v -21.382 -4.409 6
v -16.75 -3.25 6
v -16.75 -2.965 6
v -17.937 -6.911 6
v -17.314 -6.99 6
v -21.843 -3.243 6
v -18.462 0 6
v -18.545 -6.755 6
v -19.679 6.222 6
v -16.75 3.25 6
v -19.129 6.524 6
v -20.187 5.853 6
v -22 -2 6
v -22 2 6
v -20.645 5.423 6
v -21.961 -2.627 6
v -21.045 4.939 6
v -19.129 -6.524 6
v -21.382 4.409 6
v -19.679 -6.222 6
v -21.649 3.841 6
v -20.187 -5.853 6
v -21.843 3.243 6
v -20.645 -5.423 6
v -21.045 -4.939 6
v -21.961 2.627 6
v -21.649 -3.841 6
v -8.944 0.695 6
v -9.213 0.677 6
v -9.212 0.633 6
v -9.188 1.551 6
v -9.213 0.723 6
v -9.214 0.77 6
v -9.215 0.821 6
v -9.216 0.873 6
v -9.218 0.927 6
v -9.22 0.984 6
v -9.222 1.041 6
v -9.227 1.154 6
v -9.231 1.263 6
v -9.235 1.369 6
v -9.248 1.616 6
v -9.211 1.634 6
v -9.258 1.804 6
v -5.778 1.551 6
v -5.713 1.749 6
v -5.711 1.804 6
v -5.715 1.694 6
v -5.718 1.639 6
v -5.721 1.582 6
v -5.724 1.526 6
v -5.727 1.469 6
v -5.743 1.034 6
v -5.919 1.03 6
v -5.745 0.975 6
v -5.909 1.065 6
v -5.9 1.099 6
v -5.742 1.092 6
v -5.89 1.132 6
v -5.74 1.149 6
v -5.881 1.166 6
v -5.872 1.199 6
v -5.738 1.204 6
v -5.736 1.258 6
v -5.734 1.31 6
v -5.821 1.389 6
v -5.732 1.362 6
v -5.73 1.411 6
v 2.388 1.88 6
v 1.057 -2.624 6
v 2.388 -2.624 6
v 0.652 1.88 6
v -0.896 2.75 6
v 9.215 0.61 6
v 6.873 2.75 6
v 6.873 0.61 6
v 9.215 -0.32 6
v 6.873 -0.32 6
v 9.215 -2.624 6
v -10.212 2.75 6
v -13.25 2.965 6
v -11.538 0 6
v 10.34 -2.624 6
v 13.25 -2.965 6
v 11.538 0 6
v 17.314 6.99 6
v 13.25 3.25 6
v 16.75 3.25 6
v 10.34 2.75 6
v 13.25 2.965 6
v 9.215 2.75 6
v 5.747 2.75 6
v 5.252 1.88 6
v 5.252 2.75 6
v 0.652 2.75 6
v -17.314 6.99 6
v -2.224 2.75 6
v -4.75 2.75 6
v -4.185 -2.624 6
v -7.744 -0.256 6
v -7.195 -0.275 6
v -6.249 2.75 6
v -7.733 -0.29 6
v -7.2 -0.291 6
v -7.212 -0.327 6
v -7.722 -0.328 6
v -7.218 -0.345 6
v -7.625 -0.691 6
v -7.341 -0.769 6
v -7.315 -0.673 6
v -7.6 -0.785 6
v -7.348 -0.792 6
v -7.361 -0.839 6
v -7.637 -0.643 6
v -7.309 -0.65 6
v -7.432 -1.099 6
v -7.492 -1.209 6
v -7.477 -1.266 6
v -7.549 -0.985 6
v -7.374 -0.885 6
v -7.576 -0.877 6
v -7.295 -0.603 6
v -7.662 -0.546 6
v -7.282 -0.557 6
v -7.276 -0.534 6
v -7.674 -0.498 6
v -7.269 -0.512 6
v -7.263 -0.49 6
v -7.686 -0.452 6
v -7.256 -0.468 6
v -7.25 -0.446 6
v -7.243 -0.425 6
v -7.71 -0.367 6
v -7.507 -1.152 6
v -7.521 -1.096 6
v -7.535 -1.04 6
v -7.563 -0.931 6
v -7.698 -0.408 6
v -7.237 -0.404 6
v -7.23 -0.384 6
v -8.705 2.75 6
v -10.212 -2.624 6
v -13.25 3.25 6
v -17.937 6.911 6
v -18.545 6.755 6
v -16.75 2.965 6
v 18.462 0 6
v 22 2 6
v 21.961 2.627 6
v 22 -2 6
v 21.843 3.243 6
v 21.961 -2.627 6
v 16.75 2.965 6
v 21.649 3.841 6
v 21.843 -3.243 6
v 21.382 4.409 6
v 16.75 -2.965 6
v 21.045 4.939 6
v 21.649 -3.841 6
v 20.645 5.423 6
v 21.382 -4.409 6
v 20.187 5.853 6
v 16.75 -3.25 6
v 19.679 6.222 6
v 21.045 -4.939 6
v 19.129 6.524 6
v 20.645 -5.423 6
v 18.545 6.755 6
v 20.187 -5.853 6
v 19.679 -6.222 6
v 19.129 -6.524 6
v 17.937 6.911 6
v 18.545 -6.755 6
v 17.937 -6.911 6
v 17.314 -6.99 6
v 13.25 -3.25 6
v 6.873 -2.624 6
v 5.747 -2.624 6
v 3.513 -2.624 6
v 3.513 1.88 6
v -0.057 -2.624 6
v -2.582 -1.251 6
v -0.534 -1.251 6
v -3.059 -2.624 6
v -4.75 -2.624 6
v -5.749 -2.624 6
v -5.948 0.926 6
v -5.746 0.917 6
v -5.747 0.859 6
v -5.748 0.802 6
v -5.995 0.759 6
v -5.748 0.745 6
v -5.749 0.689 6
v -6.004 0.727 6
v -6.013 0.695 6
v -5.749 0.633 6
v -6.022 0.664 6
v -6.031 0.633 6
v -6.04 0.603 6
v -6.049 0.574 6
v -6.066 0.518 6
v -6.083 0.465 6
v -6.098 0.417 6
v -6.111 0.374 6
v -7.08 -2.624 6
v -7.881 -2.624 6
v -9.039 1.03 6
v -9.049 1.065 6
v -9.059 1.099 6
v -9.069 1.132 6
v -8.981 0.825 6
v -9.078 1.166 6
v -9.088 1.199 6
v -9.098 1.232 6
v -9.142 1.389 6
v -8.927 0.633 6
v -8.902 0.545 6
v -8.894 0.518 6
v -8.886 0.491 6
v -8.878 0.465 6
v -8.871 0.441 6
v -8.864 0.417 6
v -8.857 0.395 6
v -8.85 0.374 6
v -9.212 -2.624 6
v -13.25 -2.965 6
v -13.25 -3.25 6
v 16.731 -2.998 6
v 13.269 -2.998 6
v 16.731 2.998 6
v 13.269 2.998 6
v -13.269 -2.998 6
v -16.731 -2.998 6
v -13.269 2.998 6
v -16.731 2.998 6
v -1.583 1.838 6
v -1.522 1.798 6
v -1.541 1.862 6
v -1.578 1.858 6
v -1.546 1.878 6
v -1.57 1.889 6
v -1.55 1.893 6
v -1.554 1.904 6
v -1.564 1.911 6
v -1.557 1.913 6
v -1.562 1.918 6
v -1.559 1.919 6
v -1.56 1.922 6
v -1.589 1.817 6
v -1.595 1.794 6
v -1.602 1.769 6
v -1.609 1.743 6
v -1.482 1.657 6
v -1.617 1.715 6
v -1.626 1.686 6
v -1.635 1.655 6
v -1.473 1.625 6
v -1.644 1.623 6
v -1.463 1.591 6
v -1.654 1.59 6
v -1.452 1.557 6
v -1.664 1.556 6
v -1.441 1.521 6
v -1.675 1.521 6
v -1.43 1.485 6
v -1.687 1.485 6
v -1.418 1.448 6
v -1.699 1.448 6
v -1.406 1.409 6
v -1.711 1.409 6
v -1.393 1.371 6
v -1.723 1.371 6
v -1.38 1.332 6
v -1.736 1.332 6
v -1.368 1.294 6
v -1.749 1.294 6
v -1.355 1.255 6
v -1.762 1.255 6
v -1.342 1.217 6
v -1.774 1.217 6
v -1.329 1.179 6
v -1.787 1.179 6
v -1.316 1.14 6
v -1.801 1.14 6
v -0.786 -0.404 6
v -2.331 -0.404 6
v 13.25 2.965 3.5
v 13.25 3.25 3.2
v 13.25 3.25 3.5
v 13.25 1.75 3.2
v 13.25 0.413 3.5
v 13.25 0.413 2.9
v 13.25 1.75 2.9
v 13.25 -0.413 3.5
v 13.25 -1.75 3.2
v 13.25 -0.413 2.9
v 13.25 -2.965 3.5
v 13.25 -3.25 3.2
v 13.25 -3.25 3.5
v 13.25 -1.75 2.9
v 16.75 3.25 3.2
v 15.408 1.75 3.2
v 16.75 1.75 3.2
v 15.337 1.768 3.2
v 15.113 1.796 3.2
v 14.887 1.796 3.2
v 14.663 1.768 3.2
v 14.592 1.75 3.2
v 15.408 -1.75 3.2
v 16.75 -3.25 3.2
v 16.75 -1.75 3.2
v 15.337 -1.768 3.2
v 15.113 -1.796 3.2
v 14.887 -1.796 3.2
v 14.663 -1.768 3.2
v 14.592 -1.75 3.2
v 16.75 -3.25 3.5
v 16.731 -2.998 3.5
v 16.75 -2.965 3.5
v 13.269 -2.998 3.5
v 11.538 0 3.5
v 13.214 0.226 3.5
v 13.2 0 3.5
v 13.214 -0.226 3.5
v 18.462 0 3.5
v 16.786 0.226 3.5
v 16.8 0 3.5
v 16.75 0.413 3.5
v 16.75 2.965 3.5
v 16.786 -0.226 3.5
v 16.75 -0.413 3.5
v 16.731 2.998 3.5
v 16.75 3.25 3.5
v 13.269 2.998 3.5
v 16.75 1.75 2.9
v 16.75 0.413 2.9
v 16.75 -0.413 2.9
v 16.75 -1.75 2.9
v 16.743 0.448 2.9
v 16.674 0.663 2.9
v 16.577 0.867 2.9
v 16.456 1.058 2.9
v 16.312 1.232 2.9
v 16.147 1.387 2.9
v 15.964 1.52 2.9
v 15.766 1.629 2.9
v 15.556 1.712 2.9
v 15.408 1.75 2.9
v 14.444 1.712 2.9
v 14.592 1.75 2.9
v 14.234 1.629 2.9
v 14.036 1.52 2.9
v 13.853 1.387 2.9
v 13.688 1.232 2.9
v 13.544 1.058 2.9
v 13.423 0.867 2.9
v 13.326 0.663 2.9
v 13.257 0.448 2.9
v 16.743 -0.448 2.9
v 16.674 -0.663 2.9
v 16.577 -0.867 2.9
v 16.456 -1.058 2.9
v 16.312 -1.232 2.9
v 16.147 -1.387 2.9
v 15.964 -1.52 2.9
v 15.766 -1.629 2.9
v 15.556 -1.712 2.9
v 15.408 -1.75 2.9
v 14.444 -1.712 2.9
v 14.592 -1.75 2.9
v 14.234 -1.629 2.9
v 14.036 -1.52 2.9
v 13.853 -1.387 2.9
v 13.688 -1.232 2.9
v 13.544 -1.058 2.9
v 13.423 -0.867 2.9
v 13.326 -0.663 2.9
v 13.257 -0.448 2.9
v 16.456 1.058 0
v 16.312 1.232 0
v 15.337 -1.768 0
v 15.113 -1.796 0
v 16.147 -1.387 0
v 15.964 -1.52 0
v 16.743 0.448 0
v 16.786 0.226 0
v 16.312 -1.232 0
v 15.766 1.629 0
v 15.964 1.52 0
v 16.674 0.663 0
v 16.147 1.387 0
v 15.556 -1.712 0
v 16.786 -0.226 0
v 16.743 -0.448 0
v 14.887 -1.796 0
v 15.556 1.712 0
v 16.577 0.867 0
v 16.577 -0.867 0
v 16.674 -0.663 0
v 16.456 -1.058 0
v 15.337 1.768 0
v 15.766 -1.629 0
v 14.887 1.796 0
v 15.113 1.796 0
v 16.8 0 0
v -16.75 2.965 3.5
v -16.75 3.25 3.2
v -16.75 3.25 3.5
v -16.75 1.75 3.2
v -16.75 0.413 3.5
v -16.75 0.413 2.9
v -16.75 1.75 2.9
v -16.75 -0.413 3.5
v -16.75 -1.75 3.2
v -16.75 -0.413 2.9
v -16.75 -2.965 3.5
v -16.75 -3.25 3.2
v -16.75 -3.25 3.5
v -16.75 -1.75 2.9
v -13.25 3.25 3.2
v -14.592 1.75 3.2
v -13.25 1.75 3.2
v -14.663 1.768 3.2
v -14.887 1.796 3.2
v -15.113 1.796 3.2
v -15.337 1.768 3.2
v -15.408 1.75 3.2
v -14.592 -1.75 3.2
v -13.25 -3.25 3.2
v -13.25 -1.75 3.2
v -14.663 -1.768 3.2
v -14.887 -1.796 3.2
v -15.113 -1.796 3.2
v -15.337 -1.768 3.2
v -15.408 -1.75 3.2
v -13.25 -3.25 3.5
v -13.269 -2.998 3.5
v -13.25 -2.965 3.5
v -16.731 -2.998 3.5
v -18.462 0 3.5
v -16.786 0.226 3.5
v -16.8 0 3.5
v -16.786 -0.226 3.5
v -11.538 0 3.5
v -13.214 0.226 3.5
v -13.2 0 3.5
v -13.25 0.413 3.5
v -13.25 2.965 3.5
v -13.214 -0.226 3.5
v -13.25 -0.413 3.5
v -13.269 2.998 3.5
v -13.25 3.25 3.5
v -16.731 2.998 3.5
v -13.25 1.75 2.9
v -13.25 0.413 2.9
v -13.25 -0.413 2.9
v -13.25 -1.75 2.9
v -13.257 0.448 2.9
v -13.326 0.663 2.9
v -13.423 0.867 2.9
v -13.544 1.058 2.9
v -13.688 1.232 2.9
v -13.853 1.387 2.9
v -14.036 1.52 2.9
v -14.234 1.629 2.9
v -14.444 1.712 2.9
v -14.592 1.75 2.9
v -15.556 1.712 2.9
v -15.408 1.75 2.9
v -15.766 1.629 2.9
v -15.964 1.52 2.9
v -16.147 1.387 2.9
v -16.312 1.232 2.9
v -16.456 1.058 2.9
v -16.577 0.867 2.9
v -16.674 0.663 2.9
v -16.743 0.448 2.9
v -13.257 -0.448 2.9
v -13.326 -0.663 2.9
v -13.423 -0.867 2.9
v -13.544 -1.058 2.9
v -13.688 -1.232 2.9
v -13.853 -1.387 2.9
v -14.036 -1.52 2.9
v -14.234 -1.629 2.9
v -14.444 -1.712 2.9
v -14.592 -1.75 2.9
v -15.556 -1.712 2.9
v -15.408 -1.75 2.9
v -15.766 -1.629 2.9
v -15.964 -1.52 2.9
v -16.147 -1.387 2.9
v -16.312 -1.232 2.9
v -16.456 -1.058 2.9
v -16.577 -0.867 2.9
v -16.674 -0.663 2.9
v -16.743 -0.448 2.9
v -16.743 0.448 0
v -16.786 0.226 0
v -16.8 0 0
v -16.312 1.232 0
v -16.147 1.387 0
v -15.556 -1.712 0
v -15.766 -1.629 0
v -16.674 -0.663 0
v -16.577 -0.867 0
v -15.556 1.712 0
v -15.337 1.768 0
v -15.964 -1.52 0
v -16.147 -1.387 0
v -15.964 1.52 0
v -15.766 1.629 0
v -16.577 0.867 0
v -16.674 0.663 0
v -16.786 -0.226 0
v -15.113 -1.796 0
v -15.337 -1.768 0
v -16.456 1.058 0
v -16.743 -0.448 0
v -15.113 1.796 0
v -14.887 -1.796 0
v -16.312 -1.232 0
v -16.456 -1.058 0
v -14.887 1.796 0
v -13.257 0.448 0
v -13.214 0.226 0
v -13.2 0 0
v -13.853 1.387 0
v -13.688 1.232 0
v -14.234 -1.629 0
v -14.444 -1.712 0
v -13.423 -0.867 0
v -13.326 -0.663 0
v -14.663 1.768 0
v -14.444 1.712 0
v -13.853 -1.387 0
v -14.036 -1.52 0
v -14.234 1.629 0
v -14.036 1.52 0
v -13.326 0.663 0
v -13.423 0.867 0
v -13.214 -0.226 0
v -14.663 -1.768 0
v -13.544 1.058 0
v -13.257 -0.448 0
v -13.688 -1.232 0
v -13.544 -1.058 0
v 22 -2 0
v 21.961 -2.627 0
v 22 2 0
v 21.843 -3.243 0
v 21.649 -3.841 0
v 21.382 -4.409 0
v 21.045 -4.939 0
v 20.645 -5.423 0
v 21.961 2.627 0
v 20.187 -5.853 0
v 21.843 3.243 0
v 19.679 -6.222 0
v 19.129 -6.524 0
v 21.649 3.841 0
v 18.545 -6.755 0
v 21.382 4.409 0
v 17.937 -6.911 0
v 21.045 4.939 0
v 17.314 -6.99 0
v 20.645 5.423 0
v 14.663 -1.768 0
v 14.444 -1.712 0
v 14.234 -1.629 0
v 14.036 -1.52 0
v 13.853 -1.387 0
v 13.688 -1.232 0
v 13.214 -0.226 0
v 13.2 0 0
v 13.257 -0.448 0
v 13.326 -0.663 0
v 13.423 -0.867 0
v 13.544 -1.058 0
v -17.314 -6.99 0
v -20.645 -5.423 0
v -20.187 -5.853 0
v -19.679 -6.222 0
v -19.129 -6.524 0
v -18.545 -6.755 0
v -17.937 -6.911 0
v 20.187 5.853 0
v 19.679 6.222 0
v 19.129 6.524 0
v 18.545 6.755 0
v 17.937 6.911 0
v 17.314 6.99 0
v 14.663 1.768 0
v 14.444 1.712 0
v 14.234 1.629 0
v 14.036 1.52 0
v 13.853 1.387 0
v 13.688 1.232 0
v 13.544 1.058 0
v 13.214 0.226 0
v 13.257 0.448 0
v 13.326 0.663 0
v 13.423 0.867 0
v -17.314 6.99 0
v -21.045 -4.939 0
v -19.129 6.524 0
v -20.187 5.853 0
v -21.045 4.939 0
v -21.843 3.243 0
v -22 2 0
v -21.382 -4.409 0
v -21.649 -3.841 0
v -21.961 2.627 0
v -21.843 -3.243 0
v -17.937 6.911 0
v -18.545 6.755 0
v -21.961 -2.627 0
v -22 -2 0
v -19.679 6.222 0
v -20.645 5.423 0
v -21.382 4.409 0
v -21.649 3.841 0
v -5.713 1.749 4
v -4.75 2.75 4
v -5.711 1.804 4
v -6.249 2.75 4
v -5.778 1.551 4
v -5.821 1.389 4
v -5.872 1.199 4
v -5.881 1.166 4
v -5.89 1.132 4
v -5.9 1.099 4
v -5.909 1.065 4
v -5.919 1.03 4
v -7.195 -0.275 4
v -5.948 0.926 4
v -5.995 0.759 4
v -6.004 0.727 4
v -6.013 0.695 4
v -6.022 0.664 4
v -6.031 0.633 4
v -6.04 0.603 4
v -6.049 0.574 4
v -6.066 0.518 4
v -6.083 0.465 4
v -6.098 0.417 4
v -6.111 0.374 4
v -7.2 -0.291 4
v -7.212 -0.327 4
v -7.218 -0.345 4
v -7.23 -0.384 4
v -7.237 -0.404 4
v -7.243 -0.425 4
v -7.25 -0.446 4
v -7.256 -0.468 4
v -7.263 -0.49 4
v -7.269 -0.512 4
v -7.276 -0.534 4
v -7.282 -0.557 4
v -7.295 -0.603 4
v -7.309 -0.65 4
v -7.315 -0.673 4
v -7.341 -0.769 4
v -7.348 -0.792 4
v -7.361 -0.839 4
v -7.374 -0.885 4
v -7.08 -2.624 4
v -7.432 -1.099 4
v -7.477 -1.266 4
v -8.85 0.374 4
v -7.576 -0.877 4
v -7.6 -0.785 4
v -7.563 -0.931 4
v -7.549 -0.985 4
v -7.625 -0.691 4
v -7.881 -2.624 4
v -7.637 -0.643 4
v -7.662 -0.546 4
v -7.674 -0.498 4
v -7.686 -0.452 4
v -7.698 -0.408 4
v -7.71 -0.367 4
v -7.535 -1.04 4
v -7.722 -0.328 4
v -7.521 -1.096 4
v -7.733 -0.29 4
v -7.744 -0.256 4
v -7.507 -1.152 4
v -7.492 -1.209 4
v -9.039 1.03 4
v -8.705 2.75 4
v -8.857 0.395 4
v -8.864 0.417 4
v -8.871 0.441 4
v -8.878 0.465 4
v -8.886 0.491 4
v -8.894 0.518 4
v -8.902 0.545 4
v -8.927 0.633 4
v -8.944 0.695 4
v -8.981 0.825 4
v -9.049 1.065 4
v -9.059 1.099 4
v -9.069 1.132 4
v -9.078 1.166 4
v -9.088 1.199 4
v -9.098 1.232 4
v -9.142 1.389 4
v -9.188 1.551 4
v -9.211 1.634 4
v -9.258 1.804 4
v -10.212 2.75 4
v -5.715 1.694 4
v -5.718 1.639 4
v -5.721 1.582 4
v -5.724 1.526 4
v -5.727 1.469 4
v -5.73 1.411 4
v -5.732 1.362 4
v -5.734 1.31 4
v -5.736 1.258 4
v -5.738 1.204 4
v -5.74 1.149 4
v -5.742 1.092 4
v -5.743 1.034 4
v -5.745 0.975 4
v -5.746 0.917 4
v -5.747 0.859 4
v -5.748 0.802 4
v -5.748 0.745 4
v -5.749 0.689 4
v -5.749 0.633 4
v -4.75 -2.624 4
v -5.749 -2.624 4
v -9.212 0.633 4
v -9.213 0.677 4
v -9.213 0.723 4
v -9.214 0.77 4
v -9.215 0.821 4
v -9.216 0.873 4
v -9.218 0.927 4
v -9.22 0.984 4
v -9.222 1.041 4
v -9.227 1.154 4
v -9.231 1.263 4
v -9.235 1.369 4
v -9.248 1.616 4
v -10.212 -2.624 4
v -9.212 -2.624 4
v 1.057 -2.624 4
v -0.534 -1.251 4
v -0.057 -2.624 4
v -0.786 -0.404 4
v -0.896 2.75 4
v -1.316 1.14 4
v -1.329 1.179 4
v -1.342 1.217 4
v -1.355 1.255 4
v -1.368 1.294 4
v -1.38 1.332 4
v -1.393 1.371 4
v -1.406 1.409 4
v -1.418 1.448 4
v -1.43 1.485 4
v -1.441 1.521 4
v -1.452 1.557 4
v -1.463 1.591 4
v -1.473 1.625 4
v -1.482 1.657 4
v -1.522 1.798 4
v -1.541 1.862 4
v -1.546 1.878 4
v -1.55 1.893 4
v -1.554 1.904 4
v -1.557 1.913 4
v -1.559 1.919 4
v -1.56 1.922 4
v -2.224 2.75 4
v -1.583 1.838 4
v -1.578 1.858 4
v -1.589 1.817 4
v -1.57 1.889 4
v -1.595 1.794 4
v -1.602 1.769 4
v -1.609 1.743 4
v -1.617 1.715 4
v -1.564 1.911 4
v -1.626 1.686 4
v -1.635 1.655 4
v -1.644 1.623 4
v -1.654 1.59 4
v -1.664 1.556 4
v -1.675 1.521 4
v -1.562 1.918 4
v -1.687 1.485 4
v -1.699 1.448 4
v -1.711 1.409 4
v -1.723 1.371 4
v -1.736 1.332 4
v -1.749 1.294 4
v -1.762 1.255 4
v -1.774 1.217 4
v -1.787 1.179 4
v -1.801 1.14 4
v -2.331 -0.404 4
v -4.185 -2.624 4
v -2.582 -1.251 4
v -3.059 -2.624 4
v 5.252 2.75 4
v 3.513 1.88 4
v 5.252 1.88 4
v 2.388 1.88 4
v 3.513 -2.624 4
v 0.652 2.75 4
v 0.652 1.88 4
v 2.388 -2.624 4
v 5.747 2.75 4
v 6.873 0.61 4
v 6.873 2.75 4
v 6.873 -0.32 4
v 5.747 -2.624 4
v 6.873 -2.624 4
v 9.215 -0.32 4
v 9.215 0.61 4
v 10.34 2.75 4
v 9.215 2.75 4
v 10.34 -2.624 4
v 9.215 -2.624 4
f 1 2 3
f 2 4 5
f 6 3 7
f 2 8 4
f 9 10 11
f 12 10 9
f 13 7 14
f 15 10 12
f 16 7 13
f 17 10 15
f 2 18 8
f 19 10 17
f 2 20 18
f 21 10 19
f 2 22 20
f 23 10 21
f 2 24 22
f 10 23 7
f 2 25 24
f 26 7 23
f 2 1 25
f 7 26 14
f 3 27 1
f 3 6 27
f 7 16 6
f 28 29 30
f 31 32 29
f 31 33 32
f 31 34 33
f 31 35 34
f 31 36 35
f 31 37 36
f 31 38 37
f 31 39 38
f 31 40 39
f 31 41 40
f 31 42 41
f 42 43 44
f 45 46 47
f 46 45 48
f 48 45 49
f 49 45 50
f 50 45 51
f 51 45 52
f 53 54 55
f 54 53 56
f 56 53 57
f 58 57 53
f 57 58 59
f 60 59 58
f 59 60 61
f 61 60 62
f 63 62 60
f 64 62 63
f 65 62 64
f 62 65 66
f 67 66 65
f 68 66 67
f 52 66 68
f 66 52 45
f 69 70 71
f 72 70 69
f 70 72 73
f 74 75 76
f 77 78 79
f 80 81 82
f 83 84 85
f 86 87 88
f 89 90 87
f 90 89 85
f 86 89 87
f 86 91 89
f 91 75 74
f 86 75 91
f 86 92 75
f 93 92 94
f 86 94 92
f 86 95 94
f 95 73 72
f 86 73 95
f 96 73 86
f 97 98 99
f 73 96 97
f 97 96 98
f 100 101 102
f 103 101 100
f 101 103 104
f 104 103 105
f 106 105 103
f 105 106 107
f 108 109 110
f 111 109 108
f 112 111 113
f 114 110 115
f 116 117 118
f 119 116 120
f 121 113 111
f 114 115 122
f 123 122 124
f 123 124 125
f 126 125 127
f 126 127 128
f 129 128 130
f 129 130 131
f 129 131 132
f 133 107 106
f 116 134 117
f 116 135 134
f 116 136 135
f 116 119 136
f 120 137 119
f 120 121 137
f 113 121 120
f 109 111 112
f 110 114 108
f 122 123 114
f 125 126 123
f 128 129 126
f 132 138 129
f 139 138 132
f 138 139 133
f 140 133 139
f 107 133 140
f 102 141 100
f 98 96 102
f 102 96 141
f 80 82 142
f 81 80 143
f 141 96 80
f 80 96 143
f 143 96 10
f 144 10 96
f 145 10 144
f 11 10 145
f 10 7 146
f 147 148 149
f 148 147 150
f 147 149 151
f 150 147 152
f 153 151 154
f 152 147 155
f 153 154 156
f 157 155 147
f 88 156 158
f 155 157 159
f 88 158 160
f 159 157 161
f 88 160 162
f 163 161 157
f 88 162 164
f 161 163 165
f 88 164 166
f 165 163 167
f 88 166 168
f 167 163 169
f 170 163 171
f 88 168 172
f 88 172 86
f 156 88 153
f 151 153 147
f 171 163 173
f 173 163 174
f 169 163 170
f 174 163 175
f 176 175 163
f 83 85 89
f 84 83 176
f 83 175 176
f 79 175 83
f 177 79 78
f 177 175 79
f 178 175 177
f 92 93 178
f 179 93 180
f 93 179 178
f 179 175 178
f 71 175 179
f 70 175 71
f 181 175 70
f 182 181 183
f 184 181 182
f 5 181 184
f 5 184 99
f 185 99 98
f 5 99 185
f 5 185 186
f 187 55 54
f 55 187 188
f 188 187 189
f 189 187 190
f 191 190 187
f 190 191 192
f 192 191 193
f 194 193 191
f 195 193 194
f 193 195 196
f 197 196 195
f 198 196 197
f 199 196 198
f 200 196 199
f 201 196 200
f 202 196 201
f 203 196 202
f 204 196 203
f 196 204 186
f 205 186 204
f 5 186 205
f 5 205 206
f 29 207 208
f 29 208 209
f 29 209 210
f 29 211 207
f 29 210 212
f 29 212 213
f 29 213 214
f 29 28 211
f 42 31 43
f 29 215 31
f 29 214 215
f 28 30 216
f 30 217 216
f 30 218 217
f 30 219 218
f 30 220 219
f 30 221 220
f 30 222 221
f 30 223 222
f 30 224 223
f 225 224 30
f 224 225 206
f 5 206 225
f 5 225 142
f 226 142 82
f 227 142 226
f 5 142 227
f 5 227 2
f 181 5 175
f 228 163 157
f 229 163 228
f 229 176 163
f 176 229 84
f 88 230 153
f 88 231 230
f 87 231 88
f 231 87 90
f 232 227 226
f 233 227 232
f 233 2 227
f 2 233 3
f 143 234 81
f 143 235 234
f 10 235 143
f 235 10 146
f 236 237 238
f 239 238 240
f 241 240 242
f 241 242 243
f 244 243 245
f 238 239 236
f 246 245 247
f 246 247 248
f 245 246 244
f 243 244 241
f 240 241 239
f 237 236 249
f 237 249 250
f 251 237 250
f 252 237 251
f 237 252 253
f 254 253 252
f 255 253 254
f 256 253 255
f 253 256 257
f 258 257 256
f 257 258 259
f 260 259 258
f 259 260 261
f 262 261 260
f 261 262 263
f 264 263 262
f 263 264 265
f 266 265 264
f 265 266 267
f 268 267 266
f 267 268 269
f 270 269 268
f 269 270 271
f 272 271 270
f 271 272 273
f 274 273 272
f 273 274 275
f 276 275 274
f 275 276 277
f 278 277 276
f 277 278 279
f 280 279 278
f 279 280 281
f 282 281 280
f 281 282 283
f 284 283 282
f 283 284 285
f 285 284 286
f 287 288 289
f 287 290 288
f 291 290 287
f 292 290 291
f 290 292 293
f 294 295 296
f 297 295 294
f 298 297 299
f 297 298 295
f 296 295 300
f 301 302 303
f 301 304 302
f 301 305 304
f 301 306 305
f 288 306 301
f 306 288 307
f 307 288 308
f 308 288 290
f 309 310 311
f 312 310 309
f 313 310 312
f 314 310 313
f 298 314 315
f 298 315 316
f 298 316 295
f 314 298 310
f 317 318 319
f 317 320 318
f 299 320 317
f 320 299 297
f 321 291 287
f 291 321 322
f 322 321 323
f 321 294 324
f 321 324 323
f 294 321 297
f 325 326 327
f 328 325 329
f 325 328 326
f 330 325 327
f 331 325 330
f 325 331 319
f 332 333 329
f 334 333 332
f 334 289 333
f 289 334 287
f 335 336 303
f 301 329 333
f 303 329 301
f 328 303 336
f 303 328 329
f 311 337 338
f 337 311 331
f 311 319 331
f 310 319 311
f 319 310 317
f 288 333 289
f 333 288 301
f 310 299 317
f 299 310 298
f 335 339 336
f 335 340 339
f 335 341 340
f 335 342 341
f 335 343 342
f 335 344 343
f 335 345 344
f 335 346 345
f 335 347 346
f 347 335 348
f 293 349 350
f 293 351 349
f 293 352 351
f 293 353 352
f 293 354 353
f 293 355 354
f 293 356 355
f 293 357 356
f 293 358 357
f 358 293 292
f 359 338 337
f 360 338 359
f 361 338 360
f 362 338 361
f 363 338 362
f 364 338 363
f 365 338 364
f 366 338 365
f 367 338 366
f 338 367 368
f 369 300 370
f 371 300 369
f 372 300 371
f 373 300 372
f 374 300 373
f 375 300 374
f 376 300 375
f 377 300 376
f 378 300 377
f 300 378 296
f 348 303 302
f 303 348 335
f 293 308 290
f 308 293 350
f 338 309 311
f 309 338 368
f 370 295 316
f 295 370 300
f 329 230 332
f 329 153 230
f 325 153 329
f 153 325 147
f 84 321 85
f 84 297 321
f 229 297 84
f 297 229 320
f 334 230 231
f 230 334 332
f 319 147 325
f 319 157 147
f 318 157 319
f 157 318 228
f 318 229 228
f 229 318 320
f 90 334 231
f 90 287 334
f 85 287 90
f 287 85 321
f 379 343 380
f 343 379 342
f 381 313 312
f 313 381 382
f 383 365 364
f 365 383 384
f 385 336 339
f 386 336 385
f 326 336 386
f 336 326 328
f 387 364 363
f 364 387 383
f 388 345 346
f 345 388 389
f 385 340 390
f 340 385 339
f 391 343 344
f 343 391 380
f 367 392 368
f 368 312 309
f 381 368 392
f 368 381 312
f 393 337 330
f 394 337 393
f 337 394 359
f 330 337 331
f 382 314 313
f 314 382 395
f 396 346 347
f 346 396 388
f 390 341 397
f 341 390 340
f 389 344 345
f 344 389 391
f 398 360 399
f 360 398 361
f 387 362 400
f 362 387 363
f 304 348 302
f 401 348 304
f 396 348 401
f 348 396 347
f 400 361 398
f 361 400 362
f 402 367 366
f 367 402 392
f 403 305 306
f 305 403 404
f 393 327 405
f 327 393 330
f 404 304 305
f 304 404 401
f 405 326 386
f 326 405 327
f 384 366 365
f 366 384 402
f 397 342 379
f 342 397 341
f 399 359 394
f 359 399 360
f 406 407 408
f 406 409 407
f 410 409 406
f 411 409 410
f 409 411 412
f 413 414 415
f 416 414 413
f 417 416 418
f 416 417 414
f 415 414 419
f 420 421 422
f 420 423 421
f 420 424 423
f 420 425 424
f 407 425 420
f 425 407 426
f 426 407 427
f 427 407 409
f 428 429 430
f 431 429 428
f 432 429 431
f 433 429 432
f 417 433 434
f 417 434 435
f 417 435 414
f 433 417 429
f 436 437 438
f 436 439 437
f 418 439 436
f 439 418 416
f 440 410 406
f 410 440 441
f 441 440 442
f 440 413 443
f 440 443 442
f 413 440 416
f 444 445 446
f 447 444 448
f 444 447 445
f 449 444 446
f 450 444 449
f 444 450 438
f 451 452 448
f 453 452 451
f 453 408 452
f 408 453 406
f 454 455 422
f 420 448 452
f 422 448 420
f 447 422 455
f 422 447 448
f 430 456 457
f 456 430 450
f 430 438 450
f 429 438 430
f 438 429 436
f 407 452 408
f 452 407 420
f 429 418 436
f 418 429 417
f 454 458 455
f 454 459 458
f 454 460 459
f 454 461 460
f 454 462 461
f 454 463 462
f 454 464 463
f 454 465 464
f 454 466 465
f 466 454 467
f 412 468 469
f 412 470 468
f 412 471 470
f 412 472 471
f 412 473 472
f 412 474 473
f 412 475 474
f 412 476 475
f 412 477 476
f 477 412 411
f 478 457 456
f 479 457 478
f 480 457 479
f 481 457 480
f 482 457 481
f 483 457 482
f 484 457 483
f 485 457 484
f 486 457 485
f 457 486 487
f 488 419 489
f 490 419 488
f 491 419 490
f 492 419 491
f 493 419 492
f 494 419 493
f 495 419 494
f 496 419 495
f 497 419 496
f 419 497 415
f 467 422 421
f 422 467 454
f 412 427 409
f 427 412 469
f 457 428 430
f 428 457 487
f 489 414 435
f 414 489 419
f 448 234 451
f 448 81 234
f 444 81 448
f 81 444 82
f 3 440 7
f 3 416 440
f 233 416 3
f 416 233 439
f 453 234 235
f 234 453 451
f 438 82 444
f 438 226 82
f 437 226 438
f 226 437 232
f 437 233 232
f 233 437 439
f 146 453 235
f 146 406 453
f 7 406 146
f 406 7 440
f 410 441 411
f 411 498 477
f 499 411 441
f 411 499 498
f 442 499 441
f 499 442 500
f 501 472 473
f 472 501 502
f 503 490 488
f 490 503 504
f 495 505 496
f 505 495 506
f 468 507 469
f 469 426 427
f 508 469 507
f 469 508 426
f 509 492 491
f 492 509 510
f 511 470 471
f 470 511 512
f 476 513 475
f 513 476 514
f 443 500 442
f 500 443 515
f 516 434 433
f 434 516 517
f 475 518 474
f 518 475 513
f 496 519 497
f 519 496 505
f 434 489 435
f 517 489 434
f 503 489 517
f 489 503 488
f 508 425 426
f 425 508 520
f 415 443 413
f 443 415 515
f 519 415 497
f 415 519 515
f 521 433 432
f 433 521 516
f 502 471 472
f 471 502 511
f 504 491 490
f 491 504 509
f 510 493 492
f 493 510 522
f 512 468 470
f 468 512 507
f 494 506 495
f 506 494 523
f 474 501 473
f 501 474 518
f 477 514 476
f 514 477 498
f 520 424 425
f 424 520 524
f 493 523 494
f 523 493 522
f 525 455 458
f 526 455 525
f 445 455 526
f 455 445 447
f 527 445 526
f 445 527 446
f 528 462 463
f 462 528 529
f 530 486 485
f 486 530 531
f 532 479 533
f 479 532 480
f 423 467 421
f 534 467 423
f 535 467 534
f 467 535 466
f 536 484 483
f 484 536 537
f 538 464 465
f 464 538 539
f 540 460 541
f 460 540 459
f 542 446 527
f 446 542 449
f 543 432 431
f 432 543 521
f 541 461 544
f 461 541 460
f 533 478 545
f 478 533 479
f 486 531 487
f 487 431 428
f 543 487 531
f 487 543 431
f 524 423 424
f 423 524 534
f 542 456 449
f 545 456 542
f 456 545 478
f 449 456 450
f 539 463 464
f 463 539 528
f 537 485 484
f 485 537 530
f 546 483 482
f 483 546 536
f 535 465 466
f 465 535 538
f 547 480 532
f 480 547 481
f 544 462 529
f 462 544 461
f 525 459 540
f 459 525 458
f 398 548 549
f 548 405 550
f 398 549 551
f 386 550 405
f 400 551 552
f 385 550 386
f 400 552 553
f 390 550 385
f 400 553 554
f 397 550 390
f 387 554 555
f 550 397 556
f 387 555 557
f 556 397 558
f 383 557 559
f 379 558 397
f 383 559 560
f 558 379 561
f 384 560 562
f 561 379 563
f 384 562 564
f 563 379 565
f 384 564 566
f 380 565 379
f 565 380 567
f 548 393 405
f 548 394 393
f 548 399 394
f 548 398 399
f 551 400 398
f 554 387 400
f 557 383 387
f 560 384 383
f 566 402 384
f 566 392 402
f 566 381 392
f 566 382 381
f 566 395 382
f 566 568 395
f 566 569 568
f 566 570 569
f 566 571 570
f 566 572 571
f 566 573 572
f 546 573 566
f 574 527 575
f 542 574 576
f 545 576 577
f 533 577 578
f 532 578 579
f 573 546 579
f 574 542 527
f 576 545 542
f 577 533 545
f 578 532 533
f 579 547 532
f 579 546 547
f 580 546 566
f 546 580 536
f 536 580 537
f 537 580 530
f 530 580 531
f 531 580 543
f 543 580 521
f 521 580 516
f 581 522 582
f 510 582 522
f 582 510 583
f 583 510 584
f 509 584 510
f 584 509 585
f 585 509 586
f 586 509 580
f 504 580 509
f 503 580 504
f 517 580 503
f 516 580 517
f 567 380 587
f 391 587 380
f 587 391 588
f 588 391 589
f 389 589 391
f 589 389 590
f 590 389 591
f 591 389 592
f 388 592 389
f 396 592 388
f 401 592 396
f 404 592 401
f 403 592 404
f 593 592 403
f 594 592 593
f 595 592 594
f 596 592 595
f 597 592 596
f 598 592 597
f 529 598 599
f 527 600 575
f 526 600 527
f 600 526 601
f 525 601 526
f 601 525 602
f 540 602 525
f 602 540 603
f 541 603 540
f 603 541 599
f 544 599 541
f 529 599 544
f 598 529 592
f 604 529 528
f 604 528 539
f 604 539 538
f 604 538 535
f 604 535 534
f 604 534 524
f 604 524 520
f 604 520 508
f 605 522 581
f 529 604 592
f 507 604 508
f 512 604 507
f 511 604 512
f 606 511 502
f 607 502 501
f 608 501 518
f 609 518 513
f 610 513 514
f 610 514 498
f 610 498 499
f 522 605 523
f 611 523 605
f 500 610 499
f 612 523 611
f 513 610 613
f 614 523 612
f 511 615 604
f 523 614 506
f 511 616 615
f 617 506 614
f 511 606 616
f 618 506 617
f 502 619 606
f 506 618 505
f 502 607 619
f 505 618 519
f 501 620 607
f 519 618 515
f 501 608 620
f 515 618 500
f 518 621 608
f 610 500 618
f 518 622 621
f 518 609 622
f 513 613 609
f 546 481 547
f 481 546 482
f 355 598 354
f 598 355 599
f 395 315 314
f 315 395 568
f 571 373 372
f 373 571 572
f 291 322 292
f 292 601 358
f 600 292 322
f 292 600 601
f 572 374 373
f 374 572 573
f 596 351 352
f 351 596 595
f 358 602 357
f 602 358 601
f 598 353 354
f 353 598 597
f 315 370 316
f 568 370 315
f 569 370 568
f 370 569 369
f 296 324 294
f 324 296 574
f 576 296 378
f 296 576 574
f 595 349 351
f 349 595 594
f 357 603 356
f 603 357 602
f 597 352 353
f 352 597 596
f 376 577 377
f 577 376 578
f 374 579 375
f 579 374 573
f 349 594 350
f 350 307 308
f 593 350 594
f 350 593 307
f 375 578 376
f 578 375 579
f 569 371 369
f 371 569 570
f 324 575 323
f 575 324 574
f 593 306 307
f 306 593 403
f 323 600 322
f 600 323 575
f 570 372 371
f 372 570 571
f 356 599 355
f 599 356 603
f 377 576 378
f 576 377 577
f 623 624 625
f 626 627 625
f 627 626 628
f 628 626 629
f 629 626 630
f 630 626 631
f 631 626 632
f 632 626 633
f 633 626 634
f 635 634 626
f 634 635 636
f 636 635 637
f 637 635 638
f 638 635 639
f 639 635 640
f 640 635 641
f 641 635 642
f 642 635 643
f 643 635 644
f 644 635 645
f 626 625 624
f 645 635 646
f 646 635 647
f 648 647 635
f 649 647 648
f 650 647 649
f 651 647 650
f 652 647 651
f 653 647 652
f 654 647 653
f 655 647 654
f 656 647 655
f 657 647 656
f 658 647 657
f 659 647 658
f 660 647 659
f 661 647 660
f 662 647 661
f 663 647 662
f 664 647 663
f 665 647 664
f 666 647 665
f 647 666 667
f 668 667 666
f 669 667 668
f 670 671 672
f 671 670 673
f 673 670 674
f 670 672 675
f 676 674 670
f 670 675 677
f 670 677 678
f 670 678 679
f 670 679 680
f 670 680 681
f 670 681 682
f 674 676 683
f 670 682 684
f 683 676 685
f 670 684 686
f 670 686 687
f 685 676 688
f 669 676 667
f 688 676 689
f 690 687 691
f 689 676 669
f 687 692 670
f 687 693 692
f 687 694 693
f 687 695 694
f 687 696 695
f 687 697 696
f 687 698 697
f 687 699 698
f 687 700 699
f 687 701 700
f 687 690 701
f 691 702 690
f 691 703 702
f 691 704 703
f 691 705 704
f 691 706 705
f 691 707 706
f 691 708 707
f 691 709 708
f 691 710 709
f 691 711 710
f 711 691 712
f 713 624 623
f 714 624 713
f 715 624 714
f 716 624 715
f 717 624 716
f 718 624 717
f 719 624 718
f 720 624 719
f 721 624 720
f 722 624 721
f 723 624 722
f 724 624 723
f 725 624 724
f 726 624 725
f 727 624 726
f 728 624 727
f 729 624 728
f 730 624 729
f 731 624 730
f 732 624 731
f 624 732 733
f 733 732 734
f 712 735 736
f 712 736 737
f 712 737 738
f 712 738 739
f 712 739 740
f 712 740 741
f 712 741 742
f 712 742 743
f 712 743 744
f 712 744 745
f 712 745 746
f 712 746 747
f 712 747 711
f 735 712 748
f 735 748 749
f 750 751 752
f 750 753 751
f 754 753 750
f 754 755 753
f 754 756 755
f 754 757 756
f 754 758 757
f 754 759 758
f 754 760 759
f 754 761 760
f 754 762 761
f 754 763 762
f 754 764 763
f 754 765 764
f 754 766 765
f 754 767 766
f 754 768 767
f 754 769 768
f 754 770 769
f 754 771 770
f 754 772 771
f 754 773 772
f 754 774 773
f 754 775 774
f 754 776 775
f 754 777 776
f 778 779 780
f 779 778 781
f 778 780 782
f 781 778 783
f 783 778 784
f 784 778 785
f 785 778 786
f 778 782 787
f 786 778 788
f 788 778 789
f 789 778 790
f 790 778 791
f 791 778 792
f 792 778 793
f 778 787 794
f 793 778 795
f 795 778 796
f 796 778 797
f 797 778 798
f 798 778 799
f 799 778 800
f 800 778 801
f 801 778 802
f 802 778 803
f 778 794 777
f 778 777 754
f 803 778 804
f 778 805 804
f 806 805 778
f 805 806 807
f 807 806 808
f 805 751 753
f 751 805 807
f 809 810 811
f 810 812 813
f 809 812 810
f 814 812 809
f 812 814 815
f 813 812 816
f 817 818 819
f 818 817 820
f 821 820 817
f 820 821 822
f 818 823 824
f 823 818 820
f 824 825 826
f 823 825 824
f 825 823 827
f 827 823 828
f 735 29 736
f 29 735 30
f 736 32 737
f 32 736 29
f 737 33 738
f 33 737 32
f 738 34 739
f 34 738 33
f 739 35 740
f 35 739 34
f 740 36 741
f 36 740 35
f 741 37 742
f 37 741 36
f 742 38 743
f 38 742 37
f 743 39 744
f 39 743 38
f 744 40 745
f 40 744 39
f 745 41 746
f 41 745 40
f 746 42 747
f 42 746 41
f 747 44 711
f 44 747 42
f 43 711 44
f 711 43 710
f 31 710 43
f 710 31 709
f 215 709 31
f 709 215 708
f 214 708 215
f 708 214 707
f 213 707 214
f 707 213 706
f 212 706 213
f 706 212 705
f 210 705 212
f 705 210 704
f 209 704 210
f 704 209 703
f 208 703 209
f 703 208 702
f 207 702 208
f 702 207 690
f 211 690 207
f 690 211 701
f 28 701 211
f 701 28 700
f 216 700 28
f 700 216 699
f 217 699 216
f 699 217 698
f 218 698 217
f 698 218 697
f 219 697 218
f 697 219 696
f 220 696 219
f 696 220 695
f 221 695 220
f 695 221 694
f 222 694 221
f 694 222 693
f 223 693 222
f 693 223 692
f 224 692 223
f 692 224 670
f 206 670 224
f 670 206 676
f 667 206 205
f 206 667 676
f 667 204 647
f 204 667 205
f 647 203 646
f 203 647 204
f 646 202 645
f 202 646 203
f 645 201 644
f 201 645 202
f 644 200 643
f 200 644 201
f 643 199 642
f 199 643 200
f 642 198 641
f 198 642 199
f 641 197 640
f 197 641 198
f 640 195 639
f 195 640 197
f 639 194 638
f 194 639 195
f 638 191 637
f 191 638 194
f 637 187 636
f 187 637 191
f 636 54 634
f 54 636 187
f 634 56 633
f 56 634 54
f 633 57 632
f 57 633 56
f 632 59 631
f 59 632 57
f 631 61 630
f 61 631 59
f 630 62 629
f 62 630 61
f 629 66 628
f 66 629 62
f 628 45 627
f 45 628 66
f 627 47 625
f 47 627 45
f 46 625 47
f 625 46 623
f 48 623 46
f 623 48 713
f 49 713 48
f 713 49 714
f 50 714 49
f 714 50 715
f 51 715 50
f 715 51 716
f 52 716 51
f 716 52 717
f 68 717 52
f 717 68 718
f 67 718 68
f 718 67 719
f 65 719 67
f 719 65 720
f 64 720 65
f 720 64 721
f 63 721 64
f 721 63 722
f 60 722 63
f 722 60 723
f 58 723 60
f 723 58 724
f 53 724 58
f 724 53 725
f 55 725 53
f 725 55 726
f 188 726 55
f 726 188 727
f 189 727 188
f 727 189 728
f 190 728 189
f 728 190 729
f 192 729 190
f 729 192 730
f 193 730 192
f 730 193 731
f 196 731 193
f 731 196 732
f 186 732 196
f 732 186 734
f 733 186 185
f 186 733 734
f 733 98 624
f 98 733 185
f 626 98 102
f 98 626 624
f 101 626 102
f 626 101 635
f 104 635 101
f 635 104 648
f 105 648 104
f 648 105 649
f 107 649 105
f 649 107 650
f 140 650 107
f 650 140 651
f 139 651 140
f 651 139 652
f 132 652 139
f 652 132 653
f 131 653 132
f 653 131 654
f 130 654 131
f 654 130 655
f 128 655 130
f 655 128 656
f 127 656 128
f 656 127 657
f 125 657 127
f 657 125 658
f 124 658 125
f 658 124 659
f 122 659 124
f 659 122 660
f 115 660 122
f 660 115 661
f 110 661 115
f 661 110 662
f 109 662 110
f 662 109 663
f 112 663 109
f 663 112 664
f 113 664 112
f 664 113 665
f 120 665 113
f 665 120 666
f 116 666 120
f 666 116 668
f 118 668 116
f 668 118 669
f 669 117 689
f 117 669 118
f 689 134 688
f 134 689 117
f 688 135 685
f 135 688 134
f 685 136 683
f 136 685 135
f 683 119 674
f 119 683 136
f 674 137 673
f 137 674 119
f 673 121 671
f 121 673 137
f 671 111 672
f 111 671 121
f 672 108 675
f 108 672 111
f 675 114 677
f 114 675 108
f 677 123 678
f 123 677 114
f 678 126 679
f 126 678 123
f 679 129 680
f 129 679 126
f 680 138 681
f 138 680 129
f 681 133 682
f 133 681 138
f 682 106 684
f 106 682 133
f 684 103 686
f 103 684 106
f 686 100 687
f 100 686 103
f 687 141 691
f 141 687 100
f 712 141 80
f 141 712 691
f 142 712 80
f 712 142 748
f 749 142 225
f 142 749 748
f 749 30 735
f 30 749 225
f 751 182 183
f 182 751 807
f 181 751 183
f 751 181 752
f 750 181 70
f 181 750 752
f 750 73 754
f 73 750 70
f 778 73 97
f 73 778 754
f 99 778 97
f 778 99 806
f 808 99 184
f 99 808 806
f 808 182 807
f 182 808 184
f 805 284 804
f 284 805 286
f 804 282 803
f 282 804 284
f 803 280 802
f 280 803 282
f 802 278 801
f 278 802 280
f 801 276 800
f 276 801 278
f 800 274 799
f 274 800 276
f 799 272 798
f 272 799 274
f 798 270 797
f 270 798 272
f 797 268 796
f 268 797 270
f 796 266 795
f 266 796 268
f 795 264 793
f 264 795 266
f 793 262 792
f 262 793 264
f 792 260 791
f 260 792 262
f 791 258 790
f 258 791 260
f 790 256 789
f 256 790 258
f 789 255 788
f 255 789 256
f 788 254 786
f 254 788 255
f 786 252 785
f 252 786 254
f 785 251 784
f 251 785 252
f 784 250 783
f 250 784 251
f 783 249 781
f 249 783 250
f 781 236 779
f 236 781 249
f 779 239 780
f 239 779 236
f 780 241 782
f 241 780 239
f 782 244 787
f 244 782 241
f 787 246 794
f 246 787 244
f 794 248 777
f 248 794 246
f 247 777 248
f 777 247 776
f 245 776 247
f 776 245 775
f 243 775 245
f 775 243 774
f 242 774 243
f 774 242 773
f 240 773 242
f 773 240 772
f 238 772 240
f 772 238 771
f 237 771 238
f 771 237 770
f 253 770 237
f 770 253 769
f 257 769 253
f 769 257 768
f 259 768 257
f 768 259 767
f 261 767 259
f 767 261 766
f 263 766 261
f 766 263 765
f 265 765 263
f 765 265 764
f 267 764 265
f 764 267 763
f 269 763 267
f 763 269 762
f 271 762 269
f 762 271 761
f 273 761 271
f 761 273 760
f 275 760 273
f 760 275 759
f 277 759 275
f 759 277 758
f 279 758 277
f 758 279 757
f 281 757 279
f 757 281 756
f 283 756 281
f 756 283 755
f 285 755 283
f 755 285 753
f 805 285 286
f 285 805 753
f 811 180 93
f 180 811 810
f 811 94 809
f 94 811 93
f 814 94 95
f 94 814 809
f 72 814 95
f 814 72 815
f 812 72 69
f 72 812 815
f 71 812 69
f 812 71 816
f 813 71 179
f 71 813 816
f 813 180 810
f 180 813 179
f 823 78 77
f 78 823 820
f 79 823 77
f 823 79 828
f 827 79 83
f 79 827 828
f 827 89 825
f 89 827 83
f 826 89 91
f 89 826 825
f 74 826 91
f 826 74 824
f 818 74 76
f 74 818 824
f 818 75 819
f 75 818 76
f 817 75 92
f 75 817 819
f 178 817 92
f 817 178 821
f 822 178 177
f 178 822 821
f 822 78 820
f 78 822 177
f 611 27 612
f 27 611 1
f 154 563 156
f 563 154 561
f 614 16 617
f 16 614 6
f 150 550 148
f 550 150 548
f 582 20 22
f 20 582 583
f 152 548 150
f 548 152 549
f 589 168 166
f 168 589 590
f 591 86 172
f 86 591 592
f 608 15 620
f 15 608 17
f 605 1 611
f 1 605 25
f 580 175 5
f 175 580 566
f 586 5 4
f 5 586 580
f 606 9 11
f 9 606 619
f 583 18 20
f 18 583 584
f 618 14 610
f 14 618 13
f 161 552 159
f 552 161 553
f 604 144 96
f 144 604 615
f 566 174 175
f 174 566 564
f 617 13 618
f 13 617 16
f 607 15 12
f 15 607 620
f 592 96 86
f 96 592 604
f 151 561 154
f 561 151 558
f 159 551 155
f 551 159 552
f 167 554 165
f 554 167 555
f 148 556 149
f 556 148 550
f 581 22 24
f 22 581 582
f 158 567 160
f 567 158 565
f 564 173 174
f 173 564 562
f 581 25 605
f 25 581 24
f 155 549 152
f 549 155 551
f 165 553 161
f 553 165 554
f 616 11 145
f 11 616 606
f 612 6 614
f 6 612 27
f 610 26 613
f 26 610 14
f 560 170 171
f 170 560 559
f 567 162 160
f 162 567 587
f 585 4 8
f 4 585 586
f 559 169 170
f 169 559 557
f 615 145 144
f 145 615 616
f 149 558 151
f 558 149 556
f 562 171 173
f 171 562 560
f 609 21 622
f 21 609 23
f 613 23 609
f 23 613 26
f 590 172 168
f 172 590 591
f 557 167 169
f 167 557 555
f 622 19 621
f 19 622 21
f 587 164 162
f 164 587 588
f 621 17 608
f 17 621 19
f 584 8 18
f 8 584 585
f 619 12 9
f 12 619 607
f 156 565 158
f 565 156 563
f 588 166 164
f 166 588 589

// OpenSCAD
$fn = 50;


difference() {
	union() {
		hull() {
			translate(v = [-17.0000000000, 2.0000000000, 0]) {
				cylinder(h = 6, r = 5);
			}
			translate(v = [17.0000000000, 2.0000000000, 0]) {
				cylinder(h = 6, r = 5);
			}
			translate(v = [-17.0000000000, -2.0000000000, 0]) {
				cylinder(h = 6, r = 5);
			}
			translate(v = [17.0000000000, -2.0000000000, 0]) {
				cylinder(h = 6, r = 5);
			}
		}
	}
	union() {
		translate(v = [15.0000000000, 0, -20]) {
			rotate(a = [0, 180, 0]) {
				difference() {
					union() {
						translate(v = [0, 0, -26.0000000000]) {
							rotate(a = [0, 0, 0]) {
								difference() {
									union() {
										#translate(v = [-1.7500000000, -3.2500000000, -0.3000000000]) {
											cube(size = [3.5000000000, 6.5000000000, 0.3000000000]);
										}
										#translate(v = [-1.7500000000, -1.7500000000, -0.6000000000]) {
											cube(size = [3.5000000000, 3.5000000000, 0.3000000000]);
										}
										#translate(v = [-1.7500000000, -3.2500000000, 2.5000000000]) {
											cube(size = [3.5000000000, 6.5000000000, 0.3000000000]);
										}
										#translate(v = [-1.7500000000, -1.7500000000, 2.8000000000]) {
											cube(size = [3.5000000000, 3.5000000000, 0.3000000000]);
										}
										#linear_extrude(height = 2.5000000000) {
											polygon(points = [[3.4620000000, 0.0000000000], [1.7310000000, 2.9981799479], [-1.7310000000, 2.9981799479], [-3.4620000000, 0.0000000000], [-1.7310000000, -2.9981799479], [1.7310000000, -2.9981799479]]);
										}
										#translate(v = [-1.7500000000, -3.2500000000, -0.3000000000]) {
											cube(size = [3.5000000000, 6.5000000000, 0.3000000000]);
										}
										#translate(v = [-1.7500000000, -1.7500000000, -0.6000000000]) {
											cube(size = [3.5000000000, 3.5000000000, 0.3000000000]);
										}
										#translate(v = [-1.7500000000, -3.2500000000, 2.5000000000]) {
											cube(size = [3.5000000000, 6.5000000000, 0.3000000000]);
										}
										#translate(v = [-1.7500000000, -1.7500000000, 2.8000000000]) {
											cube(size = [3.5000000000, 3.5000000000, 0.3000000000]);
										}
										#translate(v = [-1.7500000000, -3.2500000000, -0.3000000000]) {
											cube(size = [3.5000000000, 6.5000000000, 0.3000000000]);
										}
										#translate(v = [-1.7500000000, -1.7500000000, -0.6000000000]) {
											cube(size = [3.5000000000, 3.5000000000, 0.3000000000]);
										}
										#translate(v = [-1.7500000000, -3.2500000000, 2.5000000000]) {
											cube(size = [3.5000000000, 6.5000000000, 0.3000000000]);
										}
										#translate(v = [-1.7500000000, -1.7500000000, 2.8000000000]) {
											cube(size = [3.5000000000, 3.5000000000, 0.3000000000]);
										}
									}
									union();
								}
							}
						}
						translate(v = [0, 0, -26.0000000000]) {
							rotate(a = [0, 0, 0]) {
								difference() {
									union() {
										#translate(v = [-1.7500000000, -3.2500000000, -0.3000000000]) {
											cube(size = [3.5000000000, 6.5000000000, 0.3000000000]);
										}
										#translate(v = [-1.7500000000, -1.7500000000, -0.6000000000]) {
											cube(size = [3.5000000000, 3.5000000000, 0.3000000000]);
										}
										#translate(v = [-1.7500000000, -3.2500000000, 2.5000000000]) {
											cube(size = [3.5000000000, 6.5000000000, 0.3000000000]);
										}
										#translate(v = [-1.7500000000, -1.7500000000, 2.8000000000]) {
											cube(size = [3.5000000000, 3.5000000000, 0.3000000000]);
										}
										#linear_extrude(height = 2.5000000000) {
											polygon(points = [[3.4620000000, 0.0000000000], [1.7310000000, 2.9981799479], [-1.7310000000, 2.9981799479], [-3.4620000000, 0.0000000000], [-1.7310000000, -2.9981799479], [1.7310000000, -2.9981799479]]);
										}
										#translate(v = [-1.7500000000, -3.2500000000, -0.3000000000]) {
											cube(size = [3.5000000000, 6.5000000000, 0.3000000000]);
										}
										#translate(v = [-1.7500000000, -1.7500000000, -0.6000000000]) {
											cube(size = [3.5000000000, 3.5000000000, 0.3000000000]);
										}
										#translate(v = [-1.7500000000, -3.2500000000, 2.5000000000]) {
											cube(size = [3.5000000000, 6.5000000000, 0.3000000000]);
										}
										#translate(v = [-1.7500000000, -1.7500000000, 2.8000000000]) {
											cube(size = [3.5000000000, 3.5000000000, 0.3000000000]);
										}
										#translate(v = [-1.7500000000, -3.2500000000, -0.3000000000]) {
											cube(size = [3.5000000000, 6.5000000000, 0.3000000000]);
										}
										#translate(v = [-1.7500000000, -1.7500000000, -0.6000000000]) {
											cube(size = [3.5000000000, 3.5000000000, 0.3000000000]);
										}
										#translate(v = [-1.7500000000, -3.2500000000, 2.5000000000]) {
											cube(size = [3.5000000000, 6.5000000000, 0.3000000000]);
										}
										#translate(v = [-1.7500000000, -1.7500000000, 2.8000000000]) {
											cube(size = [3.5000000000, 3.5000000000, 0.3000000000]);
										}
									}
									union();
								}
							}
						}
						translate(v = [0, 0, -26.0000000000]) {
							rotate(a = [0, 0, 0]) {
								difference() {
									union() {
										#translate(v = [-1.7500000000, -3.2500000000, -0.3000000000]) {
											cube(size = [3.5000000000, 6.5000000000, 0.3000000000]);
										}
										#translate(v = [-1.7500000000, -1.7500000000, -0.6000000000]) {
											cube(size = [3.5000000000, 3.5000000000, 0.3000000000]);
										}
										#translate(v = [-1.7500000000, -3.2500000000, 2.5000000000]) {
											cube(size = [3.5000000000, 6.5000000000, 0.3000000000]);
										}
										#translate(v = [-1.7500000000, -1.7500000000, 2.8000000000]) {
											cube(size = [3.5000000000, 3.5000000000, 0.3000000000]);
										}
										#linear_extrude(height = 2.5000000000) {
											polygon(points = [[3.4620000000, 0.0000000000], [1.7310000000, 2.9981799479], [-1.7310000000, 2.9981799479], [-3.4620000000, 0.0000000000], [-1.7310000000, -2.9981799479], [1.7310000000, -2.9981799479]]);
										}
										#translate(v = [-1.7500000000, -3.2500000000, -0.3000000000]) {
											cube(size = [3.5000000000, 6.5000000000, 0.3000000000]);
										}
										#translate(v = [-1.7500000000, -1.7500000000, -0.6000000000]) {
											cube(size = [3.5000000000, 3.5000000000, 0.3000000000]);
										}
										#translate(v = [-1.7500000000, -3.2500000000, 2.5000000000]) {
											cube(size = [3.5000000000, 6.5000000000, 0.3000000000]);
										}
										#translate(v = [-1.7500000000, -1.7500000000, 2.8000000000]) {
											cube(size = [3.5000000000, 3.5000000000, 0.3000000000]);
										}
										#translate(v = [-1.7500000000, -3.2500000000, -0.3000000000]) {
											cube(size = [3.5000000000, 6.5000000000, 0.3000000000]);
										}
										#translate(v = [-1.7500000000, -1.7500000000, -0.6000000000]) {
											cube(size = [3.5000000000, 3.5000000000, 0.3000000000]);
										}
										#translate(v = [-1.7500000000, -3.2500000000, 2.5000000000]) {
											cube(size = [3.5000000000, 6.5000000000, 0.3000000000]);
										}
										#translate(v = [-1.7500000000, -1.7500000000, 2.8000000000]) {
											cube(size = [3.5000000000, 3.5000000000, 0.3000000000]);
										}
									}
									union();
								}
							}
						}
						#translate(v = [0, 0, -26.0000000000]) {
							cylinder(h = 26, r = 1.5000000000);
						}
						#translate(v = [0, 0, -1.9000000000]) {
							cylinder(h = 1.9000000000, r1 = 1.8000000000, r2 = 3.6000000000);
						}
						#translate(v = [0, 0, -26.0000000000]) {
							cylinder(h = 26, r = 1.8000000000);
						}
						#translate(v = [0, 0, -26.0000000000]) {
							cylinder(h = 26, r = 1.5000000000);
						}
					}
					union();
				}
			}
		}
		translate(v = [-15.0000000000, 0, -20]) {
			rotate(a = [0, 180, 0]) {
				difference() {
					union() {
						translate(v = [0, 0, -26.0000000000]) {
							rotate(a = [0, 0, 0]) {
								difference() {
									union() {
										#translate(v = [-1.7500000000, -3.2500000000, -0.3000000000]) {
											cube(size = [3.5000000000, 6.5000000000, 0.3000000000]);
										}
										#translate(v = [-1.7500000000, -1.7500000000, -0.6000000000]) {
											cube(size = [3.5000000000, 3.5000000000, 0.3000000000]);
										}
										#translate(v = [-1.7500000000, -3.2500000000, 2.5000000000]) {
											cube(size = [3.5000000000, 6.5000000000, 0.3000000000]);
										}
										#translate(v = [-1.7500000000, -1.7500000000, 2.8000000000]) {
											cube(size = [3.5000000000, 3.5000000000, 0.3000000000]);
										}
										#linear_extrude(height = 2.5000000000) {
											polygon(points = [[3.4620000000, 0.0000000000], [1.7310000000, 2.9981799479], [-1.7310000000, 2.9981799479], [-3.4620000000, 0.0000000000], [-1.7310000000, -2.9981799479], [1.7310000000, -2.9981799479]]);
										}
										#translate(v = [-1.7500000000, -3.2500000000, -0.3000000000]) {
											cube(size = [3.5000000000, 6.5000000000, 0.3000000000]);
										}
										#translate(v = [-1.7500000000, -1.7500000000, -0.6000000000]) {
											cube(size = [3.5000000000, 3.5000000000, 0.3000000000]);
										}
										#translate(v = [-1.7500000000, -3.2500000000, 2.5000000000]) {
											cube(size = [3.5000000000, 6.5000000000, 0.3000000000]);
										}
										#translate(v = [-1.7500000000, -1.7500000000, 2.8000000000]) {
											cube(size = [3.5000000000, 3.5000000000, 0.3000000000]);
										}
										#translate(v = [-1.7500000000, -3.2500000000, -0.3000000000]) {
											cube(size = [3.5000000000, 6.5000000000, 0.3000000000]);
										}
										#translate(v = [-1.7500000000, -1.7500000000, -0.6000000000]) {
											cube(size = [3.5000000000, 3.5000000000, 0.3000000000]);
										}
										#translate(v = [-1.7500000000, -3.2500000000, 2.5000000000]) {
											cube(size = [3.5000000000, 6.5000000000, 0.3000000000]);
										}
										#translate(v = [-1.7500000000, -1.7500000000, 2.8000000000]) {
											cube(size = [3.5000000000, 3.5000000000, 0.3000000000]);
										}
									}
									union();
								}
							}
						}
						translate(v = [0, 0, -26.0000000000]) {
							rotate(a = [0, 0, 0]) {
								difference() {
									union() {
										#translate(v = [-1.7500000000, -3.2500000000, -0.3000000000]) {
											cube(size = [3.5000000000, 6.5000000000, 0.3000000000]);
										}
										#translate(v = [-1.7500000000, -1.7500000000, -0.6000000000]) {
											cube(size = [3.5000000000, 3.5000000000, 0.3000000000]);
										}
										#translate(v = [-1.7500000000, -3.2500000000, 2.5000000000]) {
											cube(size = [3.5000000000, 6.5000000000, 0.3000000000]);
										}
										#translate(v = [-1.7500000000, -1.7500000000, 2.8000000000]) {
											cube(size = [3.5000000000, 3.5000000000, 0.3000000000]);
										}
										#linear_extrude(height = 2.5000000000) {
											polygon(points = [[3.4620000000, 0.0000000000], [1.7310000000, 2.9981799479], [-1.7310000000, 2.9981799479], [-3.4620000000, 0.0000000000], [-1.7310000000, -2.9981799479], [1.7310000000, -2.9981799479]]);
										}
										#translate(v = [-1.7500000000, -3.2500000000, -0.3000000000]) {
											cube(size = [3.5000000000, 6.5000000000, 0.3000000000]);
										}
										#translate(v = [-1.7500000000, -1.7500000000, -0.6000000000]) {
											cube(size = [3.5000000000, 3.5000000000, 0.3000000000]);
										}
										#translate(v = [-1.7500000000, -3.2500000000, 2.5000000000]) {
											cube(size = [3.5000000000, 6.5000000000, 0.3000000000]);
										}
										#translate(v = [-1.7500000000, -1.7500000000, 2.8000000000]) {
											cube(size = [3.5000000000, 3.5000000000, 0.3000000000]);
										}
										#translate(v = [-1.7500000000, -3.2500000000, -0.3000000000]) {
											cube(size = [3.5000000000, 6.5000000000, 0.3000000000]);
										}
										#translate(v = [-1.7500000000, -1.7500000000, -0.6000000000]) {
											cube(size = [3.5000000000, 3.5000000000, 0.3000000000]);
										}
										#translate(v = [-1.7500000000, -3.2500000000, 2.5000000000]) {
											cube(size = [3.5000000000, 6.5000000000, 0.3000000000]);
										}
										#translate(v = [-1.7500000000, -1.7500000000, 2.8000000000]) {
											cube(size = [3.5000000000, 3.5000000000, 0.3000000000]);
										}
									}
									union();
								}
							}
						}
						translate(v = [0, 0, -26.0000000000]) {
							rotate(a = [0, 0, 0]) {
								difference() {
									union() {
										#translate(v = [-1.7500000000, -3.2500000000, -0.3000000000]) {
											cube(size = [3.5000000000, 6.5000000000, 0.3000000000]);
										}
										#translate(v = [-1.7500000000, -1.7500000000, -0.6000000000]) {
											cube(size = [3.5000000000, 3.5000000000, 0.3000000000]);
										}
										#translate(v = [-1.7500000000, -3.2500000000, 2.5000000000]) {
											cube(size = [3.5000000000, 6.5000000000, 0.3000000000]);
										}
										#translate(v = [-1.7500000000, -1.7500000000, 2.8000000000]) {
											cube(size = [3.5000000000, 3.5000000000, 0.3000000000]);
										}
										#linear_extrude(height = 2.5000000000) {
											polygon(points = [[3.4620000000, 0.0000000000], [1.7310000000, 2.9981799479], [-1.7310000000, 2.9981799479], [-3.4620000000, 0.0000000000], [-1.7310000000, -2.9981799479], [1.7310000000, -2.9981799479]]);
										}
										#translate(v = [-1.7500000000, -3.2500000000, -0.3000000000]) {
											cube(size = [3.5000000000, 6.5000000000, 0.3000000000]);
										}
										#translate(v = [-1.7500000000, -1.7500000000, -0.6000000000]) {
											cube(size = [3.5000000000, 3.5000000000, 0.3000000000]);
										}
										#translate(v = [-1.7500000000, -3.2500000000, 2.5000000000]) {
											cube(size = [3.5000000000, 6.5000000000, 0.3000000000]);
										}
										#translate(v = [-1.7500000000, -1.7500000000, 2.8000000000]) {
											cube(size = [3.5000000000, 3.5000000000, 0.3000000000]);
										}
										#translate(v = [-1.7500000000, -3.2500000000, -0.3000000000]) {
											cube(size = [3.5000000000, 6.5000000000, 0.3000000000]);
										}
										#translate(v = [-1.7500000000, -1.7500000000, -0.6000000000]) {
											cube(size = [3.5000000000, 3.5000000000, 0.3000000000]);
										}
										#translate(v = [-1.7500000000, -3.2500000000, 2.5000000000]) {
											cube(size = [3.5000000000, 6.5000000000, 0.3000000000]);
										}
										#translate(v = [-1.7500000000, -1.7500000000, 2.8000000000]) {
											cube(size = [3.5000000000, 3.5000000000, 0.3000000000]);
										}
									}
									union();
								}
							}
						}
						#translate(v = [0, 0, -26.0000000000]) {
							cylinder(h = 26, r = 1.5000000000);
						}
						#translate(v = [0, 0, -1.9000000000]) {
							cylinder(h = 1.9000000000, r1 = 1.8000000000, r2 = 3.6000000000);
						}
						#translate(v = [0, 0, -26.0000000000]) {
							cylinder(h = 26, r = 1.8000000000);
						}
						#translate(v = [0, 0, -26.0000000000]) {
							cylinder(h = 26, r = 1.5000000000);
						}
					}
					union();
				}
			}
		}
		translate(v = [-15.0000000000, 0.0000000000, 0]) {
			cylinder(h = 6, r = 1.8000000000);
		}
		translate(v = [15.0000000000, 0.0000000000, 0]) {
			cylinder(h = 6, r = 1.8000000000);
		}
		translate(v = [-15.0000000000, 0.0000000000, 0]) {
			cylinder(h = 6, r = 1.8000000000);
		}
		translate(v = [15.0000000000, 0.0000000000, 0]) {
			cylinder(h = 6, r = 1.8000000000);
		}
		translate(v = [-15.0000000000, 0.0000000000, 0]) {
			cylinder(h = 6, r = 1.8000000000);
		}
		translate(v = [15.0000000000, 0.0000000000, 0]) {
			cylinder(h = 6, r = 1.8000000000);
		}
		translate(v = [-15.0000000000, 0.0000000000, 0]) {
			cylinder(h = 6, r = 1.8000000000);
		}
		translate(v = [15.0000000000, 0.0000000000, 0]) {
			cylinder(h = 6, r = 1.8000000000);
		}
		#translate(v = [0, 0, 4]) {
			linear_extrude(height = 2) {
				text(font = "Arial:Bold", halign = "center", size = 5.6250000000, text = "MATH", valign = "center");
			}
		}
	}
}
